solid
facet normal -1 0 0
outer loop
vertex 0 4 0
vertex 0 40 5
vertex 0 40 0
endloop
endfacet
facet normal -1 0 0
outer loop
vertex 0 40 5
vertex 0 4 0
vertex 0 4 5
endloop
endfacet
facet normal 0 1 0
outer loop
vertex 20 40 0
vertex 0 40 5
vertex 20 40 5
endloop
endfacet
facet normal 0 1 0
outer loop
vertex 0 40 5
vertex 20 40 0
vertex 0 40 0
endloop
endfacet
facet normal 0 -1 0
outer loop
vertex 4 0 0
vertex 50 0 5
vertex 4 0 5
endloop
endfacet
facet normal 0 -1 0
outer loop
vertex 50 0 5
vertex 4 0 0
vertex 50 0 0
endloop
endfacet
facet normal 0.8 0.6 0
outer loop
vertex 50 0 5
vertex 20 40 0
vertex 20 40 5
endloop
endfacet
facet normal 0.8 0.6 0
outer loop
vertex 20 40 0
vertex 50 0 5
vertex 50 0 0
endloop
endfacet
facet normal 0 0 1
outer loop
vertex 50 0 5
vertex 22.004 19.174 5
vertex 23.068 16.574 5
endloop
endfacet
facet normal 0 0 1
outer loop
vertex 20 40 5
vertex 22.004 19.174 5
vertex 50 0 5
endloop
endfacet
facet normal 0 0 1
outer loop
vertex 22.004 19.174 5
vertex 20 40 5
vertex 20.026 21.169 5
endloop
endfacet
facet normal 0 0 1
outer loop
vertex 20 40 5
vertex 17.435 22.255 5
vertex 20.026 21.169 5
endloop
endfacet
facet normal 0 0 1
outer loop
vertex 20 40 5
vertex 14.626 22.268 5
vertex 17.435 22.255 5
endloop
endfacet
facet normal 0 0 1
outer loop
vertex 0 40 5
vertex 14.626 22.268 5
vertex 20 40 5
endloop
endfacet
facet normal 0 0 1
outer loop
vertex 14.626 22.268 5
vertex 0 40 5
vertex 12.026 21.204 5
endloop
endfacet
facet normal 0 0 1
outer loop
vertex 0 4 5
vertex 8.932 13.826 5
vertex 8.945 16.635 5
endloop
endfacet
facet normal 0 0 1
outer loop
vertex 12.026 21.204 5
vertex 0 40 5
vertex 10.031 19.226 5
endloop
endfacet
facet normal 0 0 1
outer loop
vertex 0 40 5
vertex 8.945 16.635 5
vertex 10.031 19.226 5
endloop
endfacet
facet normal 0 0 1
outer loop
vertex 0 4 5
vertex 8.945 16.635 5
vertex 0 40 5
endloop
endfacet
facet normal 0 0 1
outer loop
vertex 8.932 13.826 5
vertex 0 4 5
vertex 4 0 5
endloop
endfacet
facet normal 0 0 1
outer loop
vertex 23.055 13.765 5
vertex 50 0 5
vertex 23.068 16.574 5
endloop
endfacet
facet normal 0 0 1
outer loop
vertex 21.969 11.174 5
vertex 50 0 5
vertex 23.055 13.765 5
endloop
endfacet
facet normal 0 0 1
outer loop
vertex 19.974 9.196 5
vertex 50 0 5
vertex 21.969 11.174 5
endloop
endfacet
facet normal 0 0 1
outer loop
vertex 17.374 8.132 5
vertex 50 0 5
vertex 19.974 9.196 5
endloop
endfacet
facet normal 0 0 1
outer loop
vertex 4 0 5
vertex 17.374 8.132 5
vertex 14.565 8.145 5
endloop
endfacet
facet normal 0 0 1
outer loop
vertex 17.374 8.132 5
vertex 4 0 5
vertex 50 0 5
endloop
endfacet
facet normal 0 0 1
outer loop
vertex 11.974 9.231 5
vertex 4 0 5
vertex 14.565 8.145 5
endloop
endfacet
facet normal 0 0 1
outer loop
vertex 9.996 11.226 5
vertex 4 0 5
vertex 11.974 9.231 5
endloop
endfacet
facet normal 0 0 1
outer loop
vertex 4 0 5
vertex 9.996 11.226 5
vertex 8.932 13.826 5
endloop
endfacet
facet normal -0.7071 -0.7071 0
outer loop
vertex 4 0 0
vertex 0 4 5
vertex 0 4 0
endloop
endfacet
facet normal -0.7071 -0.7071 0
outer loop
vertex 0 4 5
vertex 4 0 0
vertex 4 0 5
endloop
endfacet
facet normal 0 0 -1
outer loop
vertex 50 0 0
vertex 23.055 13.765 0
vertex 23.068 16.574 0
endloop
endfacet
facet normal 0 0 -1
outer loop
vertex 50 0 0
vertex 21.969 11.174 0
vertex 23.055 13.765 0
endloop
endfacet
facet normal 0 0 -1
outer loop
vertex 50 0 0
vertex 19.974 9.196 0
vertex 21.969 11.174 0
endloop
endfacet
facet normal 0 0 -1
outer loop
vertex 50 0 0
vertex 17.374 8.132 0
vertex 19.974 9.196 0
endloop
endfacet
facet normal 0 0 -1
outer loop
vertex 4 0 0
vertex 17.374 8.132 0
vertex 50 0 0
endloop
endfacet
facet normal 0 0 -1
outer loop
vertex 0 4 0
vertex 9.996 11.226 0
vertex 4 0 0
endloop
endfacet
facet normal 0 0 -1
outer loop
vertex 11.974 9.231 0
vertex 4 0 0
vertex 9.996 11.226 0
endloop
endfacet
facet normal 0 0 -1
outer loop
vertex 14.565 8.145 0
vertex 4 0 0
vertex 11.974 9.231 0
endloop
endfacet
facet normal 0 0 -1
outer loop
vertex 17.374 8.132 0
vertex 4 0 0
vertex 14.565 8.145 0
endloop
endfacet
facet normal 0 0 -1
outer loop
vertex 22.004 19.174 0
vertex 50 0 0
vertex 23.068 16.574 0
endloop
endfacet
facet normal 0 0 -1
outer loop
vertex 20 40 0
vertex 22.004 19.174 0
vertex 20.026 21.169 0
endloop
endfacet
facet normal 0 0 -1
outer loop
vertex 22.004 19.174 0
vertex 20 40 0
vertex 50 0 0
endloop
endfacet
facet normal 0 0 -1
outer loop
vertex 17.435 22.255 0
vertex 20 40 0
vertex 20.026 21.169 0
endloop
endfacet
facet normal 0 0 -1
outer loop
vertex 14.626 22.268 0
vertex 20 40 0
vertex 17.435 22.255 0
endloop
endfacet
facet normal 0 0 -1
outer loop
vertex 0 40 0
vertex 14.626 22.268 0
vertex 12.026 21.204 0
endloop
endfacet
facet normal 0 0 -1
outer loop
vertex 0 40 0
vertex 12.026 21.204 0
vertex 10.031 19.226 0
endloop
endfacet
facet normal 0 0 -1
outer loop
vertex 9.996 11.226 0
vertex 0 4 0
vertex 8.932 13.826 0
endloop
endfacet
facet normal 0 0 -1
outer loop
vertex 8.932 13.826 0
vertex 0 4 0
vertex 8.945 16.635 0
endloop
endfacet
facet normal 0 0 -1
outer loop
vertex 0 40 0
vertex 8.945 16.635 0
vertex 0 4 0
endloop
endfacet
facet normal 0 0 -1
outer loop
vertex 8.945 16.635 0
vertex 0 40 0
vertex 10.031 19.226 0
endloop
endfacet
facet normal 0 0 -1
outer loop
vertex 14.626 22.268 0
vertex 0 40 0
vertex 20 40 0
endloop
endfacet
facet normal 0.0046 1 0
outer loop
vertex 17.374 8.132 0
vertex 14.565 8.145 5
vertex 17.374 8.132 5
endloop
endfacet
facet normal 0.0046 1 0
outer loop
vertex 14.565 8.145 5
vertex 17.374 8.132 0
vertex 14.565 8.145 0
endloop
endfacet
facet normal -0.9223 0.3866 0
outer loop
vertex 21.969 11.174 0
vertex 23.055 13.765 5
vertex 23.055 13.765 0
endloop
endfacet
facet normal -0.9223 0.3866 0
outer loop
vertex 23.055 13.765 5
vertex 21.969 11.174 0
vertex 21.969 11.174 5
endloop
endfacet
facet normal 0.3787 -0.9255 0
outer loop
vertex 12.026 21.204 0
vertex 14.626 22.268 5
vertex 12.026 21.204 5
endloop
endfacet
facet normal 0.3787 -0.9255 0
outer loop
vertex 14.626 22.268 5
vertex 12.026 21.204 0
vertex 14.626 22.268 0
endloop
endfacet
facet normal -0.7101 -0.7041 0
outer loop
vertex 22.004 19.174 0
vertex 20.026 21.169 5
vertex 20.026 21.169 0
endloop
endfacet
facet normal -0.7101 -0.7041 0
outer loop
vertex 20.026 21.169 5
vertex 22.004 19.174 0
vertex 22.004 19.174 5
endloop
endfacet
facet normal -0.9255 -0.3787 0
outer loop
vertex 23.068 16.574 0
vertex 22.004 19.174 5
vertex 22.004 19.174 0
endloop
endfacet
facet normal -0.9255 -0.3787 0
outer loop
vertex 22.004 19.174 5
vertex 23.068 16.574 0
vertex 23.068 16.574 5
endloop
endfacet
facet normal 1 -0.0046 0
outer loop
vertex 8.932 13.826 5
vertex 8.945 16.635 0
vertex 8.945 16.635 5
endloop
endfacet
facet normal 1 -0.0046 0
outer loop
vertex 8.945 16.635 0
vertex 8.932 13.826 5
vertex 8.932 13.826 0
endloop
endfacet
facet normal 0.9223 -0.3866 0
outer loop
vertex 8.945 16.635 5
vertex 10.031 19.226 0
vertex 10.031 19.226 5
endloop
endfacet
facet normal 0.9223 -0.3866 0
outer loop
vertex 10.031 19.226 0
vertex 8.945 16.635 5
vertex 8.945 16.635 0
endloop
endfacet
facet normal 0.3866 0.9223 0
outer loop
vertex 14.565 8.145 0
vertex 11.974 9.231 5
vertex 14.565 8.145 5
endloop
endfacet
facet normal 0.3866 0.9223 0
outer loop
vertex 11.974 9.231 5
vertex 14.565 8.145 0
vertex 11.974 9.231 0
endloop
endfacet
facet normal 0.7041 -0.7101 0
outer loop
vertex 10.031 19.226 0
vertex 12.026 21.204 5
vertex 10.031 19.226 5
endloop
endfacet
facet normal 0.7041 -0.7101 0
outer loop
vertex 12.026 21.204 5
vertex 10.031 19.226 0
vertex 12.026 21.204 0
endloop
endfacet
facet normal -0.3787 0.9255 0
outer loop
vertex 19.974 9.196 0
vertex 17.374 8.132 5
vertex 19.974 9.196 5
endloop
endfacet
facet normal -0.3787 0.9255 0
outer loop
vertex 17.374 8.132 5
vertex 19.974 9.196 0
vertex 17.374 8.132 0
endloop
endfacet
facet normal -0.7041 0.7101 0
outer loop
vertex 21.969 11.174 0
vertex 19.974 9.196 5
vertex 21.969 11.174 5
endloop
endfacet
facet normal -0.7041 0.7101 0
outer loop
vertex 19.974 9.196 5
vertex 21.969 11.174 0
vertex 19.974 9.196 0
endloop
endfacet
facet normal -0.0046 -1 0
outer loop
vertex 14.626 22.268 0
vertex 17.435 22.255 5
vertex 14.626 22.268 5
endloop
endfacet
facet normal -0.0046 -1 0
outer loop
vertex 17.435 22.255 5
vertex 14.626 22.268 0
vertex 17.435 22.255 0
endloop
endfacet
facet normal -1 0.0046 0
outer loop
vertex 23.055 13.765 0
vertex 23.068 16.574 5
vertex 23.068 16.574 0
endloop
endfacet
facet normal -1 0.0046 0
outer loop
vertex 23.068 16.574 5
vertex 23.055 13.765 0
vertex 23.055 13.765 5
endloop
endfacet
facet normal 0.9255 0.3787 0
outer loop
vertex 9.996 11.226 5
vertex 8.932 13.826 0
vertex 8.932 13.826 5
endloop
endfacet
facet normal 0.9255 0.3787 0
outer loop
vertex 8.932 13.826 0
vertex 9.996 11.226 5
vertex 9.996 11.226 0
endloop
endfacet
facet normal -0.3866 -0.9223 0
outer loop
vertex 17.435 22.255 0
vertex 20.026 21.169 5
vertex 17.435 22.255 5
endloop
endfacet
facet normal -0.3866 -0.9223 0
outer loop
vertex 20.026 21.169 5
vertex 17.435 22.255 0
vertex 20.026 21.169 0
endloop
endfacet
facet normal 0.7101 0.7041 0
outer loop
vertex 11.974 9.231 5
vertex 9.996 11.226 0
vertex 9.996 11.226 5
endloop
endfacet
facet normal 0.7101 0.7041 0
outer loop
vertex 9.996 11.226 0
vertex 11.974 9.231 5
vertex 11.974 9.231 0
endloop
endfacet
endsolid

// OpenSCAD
$fn = 32;

// ----------------------------------------------------------------------
// Bracket plate: gusset 50 x 40
// ----------------------------------------------------------------------

// --- parameters (mm) ---
hole_r = 3;               // bolt hole radius
plate_t = 5;              // plate thickness, Z (extrusion height)
gus_a = 50;               // base length
gus_b = 40;               // height
top_x = 20;               // top edge X of the angled cut
light_r = 7.2;            // lightening hole radius

light_d = 2 * light_r;

profile = [[4, 0], [25, 0], [50, 0], [20, 40], [0, 40], [0, 4]];  // primary outline, 6 points, counter clockwise
void_1 = [[23.068, 16.574], [22.004, 19.174], [20.026, 21.169], [17.435, 22.255], [14.626, 22.268], [12.026, 21.204], [10.031, 19.226], [8.945, 16.635], [8.932, 13.826], [9.996, 11.226], [11.974, 9.231], [14.565, 8.145], [17.374, 8.132], [19.974, 9.196], [21.969, 11.174], [23.055, 13.765]];  // lightening hole, 16 points

// --- the one profile operation ---
difference() {
  linear_extrude(height = plate_t) polygon(points = profile);
  translate([0, 0, -1])
    linear_extrude(height = plate_t + 2) polygon(points = void_1);
}
